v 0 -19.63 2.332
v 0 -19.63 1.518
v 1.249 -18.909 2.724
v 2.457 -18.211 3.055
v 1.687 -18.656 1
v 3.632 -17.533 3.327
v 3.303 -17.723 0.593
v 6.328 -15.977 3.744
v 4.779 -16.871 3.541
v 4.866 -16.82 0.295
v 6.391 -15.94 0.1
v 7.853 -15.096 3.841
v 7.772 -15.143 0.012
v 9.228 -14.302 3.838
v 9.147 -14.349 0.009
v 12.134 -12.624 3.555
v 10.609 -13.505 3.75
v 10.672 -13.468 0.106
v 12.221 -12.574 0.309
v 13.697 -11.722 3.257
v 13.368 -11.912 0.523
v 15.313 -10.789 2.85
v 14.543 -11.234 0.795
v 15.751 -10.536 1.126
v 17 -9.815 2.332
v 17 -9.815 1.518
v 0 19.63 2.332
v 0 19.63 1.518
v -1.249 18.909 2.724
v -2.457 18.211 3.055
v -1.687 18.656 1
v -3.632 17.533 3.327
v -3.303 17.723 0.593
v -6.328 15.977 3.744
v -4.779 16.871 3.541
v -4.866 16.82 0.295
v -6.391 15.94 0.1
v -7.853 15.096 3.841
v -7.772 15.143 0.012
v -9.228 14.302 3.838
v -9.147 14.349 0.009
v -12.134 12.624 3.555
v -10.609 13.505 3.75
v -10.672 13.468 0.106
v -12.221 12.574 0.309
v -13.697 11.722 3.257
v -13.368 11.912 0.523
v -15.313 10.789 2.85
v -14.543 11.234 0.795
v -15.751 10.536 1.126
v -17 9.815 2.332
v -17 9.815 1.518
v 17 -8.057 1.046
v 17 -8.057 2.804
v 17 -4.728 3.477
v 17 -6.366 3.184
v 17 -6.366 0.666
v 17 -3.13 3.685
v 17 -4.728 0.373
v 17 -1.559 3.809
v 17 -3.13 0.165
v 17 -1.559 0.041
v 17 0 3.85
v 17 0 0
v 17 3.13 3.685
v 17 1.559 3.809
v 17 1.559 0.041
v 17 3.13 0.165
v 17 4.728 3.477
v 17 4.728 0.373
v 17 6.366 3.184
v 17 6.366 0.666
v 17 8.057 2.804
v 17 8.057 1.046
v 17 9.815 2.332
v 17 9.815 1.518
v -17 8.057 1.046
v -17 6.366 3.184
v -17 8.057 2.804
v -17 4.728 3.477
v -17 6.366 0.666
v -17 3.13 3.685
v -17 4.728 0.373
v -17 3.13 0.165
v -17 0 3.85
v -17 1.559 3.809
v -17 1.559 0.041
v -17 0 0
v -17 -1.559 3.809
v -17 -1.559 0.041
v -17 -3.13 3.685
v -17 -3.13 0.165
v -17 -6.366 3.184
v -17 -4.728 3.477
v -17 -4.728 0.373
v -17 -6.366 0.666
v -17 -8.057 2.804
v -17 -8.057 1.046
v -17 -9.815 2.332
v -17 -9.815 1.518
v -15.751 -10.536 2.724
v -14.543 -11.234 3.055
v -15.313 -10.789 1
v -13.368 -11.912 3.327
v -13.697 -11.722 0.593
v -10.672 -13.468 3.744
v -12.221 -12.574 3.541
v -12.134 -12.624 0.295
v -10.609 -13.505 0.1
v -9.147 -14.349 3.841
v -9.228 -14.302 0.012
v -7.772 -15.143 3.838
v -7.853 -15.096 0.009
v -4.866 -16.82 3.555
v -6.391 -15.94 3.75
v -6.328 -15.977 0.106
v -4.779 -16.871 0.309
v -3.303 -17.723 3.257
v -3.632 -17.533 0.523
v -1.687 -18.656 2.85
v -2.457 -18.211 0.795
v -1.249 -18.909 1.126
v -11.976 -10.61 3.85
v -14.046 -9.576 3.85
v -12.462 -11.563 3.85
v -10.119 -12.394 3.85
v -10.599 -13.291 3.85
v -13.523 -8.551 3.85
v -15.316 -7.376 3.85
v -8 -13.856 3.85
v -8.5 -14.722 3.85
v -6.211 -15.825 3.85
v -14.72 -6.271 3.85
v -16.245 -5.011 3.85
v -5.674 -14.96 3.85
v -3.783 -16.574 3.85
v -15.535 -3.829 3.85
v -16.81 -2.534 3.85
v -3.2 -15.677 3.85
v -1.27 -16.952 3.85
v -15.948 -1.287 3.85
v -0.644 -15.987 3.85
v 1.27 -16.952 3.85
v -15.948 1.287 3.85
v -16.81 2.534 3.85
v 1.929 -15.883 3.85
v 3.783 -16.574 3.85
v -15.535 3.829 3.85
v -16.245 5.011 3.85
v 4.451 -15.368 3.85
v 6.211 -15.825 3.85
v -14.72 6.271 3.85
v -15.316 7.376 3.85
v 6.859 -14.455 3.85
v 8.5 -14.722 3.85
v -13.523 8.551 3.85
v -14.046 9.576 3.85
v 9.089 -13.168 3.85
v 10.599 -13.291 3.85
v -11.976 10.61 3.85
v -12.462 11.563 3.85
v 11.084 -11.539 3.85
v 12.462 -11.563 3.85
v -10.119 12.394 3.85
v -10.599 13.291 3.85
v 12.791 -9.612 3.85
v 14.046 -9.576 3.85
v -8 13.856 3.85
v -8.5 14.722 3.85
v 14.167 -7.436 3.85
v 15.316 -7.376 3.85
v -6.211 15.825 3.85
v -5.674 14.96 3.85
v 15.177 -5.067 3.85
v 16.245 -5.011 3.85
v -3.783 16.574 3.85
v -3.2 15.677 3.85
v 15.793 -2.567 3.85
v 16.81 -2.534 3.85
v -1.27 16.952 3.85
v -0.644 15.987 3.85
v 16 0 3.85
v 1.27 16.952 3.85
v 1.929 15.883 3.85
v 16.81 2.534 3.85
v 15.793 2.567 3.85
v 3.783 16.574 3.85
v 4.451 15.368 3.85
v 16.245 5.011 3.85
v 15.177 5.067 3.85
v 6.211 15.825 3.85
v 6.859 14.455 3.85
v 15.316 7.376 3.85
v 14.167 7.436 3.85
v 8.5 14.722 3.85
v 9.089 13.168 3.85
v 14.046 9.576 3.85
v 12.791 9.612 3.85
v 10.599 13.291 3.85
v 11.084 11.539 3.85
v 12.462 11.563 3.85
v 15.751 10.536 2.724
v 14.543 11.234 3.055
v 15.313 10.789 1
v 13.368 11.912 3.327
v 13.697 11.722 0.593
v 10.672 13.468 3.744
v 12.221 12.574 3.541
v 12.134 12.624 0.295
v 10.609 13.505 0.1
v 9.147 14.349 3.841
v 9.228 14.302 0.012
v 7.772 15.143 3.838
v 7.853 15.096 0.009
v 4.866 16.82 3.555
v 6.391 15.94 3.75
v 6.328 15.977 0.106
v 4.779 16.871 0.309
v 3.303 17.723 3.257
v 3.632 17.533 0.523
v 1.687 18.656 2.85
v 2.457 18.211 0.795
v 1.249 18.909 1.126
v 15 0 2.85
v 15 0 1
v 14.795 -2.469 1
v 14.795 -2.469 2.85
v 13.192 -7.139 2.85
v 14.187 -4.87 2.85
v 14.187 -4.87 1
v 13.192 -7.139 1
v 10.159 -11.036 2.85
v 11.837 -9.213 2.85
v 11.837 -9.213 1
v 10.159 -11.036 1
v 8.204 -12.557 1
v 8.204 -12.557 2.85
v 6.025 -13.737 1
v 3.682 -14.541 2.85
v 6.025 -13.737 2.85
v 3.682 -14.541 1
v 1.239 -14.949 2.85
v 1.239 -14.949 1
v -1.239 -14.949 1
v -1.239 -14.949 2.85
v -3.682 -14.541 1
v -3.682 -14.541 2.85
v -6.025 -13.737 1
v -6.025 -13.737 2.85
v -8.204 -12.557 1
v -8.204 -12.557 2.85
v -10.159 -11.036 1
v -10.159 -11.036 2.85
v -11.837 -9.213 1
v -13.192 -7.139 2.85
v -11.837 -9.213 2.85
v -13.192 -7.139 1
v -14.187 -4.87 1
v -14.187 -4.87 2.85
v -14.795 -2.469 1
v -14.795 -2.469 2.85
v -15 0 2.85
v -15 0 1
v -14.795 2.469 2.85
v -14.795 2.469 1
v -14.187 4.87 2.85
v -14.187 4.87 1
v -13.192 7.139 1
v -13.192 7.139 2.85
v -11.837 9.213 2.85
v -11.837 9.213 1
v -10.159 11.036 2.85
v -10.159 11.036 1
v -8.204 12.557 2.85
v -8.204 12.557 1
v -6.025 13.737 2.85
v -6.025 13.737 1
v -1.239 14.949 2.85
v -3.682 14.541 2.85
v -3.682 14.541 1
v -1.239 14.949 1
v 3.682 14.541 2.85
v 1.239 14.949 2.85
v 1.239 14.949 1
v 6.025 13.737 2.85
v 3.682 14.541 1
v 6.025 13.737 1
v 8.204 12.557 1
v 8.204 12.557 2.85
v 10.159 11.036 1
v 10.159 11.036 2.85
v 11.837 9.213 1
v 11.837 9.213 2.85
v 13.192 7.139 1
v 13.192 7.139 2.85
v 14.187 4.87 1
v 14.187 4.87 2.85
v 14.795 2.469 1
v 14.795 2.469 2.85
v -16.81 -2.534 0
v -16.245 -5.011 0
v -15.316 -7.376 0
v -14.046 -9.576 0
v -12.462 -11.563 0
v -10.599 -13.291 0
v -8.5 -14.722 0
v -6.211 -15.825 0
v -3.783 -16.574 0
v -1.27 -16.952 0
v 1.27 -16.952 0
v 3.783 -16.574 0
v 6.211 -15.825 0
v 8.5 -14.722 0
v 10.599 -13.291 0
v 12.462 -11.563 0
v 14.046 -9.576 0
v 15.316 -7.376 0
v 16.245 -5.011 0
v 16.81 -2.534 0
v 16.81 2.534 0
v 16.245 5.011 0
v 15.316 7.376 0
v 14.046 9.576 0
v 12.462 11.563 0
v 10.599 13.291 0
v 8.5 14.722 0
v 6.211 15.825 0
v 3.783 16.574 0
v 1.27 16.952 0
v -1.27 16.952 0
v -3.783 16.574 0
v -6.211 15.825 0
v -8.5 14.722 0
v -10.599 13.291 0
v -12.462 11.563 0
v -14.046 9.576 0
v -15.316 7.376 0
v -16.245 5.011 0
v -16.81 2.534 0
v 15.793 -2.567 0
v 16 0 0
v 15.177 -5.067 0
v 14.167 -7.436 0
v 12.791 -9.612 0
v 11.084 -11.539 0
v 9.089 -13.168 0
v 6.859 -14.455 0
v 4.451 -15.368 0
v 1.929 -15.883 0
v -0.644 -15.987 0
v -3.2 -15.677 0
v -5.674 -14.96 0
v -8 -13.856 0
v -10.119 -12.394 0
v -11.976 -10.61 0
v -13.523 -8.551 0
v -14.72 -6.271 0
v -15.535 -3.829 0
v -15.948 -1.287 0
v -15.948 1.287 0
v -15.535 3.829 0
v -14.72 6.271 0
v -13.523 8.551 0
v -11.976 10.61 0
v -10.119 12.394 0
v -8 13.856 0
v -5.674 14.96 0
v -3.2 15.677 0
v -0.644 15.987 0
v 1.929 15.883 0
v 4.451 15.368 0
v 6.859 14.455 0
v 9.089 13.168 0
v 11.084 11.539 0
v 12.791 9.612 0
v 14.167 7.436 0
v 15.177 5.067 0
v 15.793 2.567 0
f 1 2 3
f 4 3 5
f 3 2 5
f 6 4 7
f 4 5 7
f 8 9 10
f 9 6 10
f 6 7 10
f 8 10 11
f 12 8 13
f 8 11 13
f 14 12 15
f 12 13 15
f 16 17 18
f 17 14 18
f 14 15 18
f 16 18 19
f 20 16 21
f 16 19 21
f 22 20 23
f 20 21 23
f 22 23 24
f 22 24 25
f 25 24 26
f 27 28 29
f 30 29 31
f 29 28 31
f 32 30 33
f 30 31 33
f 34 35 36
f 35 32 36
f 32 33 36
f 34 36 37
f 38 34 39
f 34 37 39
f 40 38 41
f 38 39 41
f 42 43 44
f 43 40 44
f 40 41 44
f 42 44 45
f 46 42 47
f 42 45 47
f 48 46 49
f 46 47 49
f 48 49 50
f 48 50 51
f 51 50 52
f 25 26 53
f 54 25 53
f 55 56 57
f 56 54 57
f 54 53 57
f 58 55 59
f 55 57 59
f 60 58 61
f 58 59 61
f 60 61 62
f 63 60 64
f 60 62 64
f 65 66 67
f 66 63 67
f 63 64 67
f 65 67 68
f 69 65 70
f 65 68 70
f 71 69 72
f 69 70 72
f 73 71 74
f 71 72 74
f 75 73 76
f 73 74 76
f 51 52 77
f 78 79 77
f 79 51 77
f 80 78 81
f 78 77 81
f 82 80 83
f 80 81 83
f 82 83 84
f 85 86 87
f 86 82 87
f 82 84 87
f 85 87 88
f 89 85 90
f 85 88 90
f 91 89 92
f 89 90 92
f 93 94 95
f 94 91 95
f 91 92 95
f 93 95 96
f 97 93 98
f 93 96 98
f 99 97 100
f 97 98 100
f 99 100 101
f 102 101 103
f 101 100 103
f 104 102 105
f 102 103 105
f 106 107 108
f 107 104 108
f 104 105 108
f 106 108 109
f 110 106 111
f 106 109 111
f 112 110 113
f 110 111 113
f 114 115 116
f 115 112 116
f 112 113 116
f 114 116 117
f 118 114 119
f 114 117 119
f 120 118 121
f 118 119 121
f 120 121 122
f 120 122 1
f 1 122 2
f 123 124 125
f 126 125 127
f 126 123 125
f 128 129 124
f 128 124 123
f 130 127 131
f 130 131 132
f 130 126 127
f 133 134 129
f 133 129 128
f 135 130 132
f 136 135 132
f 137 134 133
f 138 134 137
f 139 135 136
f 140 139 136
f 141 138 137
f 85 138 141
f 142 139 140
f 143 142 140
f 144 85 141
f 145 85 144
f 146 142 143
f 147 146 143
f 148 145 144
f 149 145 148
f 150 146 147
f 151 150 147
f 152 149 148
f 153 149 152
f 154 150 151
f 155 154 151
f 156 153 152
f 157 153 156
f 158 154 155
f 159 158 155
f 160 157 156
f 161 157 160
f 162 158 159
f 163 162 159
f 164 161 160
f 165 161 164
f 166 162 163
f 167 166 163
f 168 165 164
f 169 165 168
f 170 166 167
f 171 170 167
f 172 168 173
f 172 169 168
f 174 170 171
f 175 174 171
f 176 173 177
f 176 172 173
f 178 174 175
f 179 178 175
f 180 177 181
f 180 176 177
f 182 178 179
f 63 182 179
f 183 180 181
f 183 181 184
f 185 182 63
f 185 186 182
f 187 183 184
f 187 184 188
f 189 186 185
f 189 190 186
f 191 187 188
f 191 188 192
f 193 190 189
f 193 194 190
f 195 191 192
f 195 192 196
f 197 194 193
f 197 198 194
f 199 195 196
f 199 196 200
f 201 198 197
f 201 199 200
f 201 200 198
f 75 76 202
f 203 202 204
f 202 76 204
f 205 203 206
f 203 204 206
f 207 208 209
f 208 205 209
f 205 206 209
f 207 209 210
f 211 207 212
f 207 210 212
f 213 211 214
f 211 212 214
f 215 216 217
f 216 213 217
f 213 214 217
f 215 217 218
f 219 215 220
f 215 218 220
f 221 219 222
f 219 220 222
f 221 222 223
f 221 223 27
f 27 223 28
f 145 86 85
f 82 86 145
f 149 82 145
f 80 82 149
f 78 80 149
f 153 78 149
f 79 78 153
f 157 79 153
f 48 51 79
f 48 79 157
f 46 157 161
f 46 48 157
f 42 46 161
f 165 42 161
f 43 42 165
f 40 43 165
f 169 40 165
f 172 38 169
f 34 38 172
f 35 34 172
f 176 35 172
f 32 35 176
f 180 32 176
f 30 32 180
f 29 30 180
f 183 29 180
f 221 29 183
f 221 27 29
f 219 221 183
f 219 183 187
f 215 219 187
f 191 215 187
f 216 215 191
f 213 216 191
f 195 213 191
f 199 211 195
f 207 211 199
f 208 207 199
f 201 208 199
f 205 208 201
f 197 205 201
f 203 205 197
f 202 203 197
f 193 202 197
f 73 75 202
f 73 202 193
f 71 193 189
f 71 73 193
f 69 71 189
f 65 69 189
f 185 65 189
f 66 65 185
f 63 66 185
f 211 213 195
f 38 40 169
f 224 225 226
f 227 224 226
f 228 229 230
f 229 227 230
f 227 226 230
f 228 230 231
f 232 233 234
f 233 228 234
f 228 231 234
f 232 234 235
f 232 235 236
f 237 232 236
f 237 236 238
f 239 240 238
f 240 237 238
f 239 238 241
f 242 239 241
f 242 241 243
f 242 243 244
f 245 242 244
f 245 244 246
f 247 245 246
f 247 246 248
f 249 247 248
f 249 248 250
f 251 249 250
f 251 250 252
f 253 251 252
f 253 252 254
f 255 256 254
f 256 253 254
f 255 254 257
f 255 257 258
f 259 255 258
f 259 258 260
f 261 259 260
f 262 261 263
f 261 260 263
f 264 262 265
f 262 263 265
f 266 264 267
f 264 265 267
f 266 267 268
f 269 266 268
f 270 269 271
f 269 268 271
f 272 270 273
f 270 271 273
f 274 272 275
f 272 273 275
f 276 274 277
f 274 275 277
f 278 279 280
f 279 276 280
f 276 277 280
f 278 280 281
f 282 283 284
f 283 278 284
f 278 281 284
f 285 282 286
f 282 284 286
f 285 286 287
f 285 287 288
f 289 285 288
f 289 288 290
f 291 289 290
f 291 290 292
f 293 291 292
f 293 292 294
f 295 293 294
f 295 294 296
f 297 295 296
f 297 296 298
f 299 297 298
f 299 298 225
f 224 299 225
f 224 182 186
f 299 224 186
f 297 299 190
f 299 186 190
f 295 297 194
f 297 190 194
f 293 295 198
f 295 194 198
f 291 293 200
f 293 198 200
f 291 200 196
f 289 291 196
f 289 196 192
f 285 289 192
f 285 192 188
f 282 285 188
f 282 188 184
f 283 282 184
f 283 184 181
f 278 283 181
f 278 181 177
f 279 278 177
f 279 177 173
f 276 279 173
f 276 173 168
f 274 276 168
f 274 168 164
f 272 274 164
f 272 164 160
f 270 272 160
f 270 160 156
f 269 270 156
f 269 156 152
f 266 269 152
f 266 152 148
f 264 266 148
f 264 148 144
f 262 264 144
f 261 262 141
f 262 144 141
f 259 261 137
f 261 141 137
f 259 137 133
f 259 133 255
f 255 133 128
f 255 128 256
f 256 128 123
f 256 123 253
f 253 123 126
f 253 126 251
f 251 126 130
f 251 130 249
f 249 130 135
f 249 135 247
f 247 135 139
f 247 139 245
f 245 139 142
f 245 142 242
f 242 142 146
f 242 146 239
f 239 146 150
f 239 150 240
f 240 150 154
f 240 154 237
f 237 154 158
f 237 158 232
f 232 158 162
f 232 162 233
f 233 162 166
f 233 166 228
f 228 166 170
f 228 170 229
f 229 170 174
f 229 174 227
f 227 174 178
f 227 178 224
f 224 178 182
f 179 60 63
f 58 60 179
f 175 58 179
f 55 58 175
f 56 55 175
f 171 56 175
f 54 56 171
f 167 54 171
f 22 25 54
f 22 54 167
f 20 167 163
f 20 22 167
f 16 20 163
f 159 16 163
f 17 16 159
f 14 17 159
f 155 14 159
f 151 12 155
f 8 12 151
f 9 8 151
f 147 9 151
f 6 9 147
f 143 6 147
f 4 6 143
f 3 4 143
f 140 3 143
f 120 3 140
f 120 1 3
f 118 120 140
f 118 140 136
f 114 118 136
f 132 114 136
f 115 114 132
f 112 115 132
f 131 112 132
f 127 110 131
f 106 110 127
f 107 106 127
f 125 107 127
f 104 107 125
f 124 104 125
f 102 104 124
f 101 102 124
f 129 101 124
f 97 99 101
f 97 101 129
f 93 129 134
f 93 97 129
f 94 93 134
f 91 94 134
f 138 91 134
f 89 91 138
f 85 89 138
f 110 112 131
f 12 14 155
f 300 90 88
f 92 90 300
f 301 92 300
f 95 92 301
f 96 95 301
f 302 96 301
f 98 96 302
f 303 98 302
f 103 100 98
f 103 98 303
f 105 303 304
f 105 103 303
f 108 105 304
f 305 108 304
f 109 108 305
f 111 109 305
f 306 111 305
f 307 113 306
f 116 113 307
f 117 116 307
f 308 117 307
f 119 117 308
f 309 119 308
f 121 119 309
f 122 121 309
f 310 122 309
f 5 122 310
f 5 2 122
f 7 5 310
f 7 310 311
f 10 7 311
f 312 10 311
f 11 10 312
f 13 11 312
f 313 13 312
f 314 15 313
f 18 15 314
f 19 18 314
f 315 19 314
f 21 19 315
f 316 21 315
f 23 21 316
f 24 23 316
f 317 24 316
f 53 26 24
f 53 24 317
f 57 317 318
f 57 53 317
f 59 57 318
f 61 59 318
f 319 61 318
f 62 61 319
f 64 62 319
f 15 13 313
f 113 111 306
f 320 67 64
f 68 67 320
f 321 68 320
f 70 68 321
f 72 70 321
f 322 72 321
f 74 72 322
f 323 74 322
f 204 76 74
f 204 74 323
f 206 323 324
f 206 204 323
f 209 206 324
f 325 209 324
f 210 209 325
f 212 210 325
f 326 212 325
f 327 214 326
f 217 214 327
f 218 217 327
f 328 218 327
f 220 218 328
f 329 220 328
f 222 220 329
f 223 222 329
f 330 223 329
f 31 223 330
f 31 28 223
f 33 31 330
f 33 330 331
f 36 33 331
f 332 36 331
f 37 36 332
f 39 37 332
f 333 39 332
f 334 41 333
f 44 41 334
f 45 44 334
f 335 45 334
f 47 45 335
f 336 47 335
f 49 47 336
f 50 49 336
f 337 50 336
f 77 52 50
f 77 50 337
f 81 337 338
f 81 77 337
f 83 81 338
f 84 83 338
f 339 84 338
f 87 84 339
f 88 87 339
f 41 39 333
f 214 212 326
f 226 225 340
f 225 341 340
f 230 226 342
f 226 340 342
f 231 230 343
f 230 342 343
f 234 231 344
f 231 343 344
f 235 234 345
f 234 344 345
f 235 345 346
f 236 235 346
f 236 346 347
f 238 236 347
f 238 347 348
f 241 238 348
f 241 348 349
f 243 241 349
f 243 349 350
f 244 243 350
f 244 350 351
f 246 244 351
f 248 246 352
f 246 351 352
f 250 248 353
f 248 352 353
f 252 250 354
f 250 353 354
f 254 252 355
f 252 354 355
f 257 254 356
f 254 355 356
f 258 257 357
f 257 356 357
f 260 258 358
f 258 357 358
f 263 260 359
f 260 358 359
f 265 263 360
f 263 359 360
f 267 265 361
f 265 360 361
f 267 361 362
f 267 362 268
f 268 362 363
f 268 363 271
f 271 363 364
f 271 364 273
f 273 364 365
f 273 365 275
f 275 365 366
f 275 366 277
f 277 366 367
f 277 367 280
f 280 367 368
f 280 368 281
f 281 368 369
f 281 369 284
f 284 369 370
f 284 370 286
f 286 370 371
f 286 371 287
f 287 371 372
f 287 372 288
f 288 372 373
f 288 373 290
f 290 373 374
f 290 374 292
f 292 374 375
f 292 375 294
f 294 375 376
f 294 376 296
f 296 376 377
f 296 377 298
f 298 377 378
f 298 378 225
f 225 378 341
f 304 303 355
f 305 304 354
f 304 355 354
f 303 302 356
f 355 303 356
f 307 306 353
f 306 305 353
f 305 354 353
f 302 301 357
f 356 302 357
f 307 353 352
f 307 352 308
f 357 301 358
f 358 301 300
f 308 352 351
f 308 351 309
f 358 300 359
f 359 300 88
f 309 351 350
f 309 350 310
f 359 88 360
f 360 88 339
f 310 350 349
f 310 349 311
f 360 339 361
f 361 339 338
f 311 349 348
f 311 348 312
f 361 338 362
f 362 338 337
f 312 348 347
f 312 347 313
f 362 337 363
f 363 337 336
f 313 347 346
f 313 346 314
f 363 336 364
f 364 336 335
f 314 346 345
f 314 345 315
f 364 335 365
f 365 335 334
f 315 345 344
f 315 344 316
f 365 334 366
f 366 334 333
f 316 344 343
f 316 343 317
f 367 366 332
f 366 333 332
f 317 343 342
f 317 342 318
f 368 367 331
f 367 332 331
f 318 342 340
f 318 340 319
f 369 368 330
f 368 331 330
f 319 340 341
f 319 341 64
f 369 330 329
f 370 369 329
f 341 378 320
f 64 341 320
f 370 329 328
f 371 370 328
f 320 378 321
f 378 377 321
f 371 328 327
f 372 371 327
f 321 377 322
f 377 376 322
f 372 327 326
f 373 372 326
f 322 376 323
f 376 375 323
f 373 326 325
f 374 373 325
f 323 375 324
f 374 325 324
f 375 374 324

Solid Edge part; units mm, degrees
sketch "Sketch1" plane through (0, 0, 0) normal (0, 0, 1) x (1, 0, 0)
  line L0 (17, 9.815) -> (0, 19.6299)
  line L1 (0, 19.6299) -> (-17, 9.815)
  line L2 (-17, 9.815) -> (-17, -9.815)
  line L3 (-17, -9.815) -> (0, -19.6299)
  line L4 (0, -19.6299) -> (17, -9.815)
  line L5 (17, -9.815) -> (17, 9.815)
  circle A0 centre (0, 0) radius 15
  dimension "D1" = 34
  dimension "D2" = 30
extrude "Protrusion1" add sketch "Sketch1" along normal blind 3.85
chamfer "Fase_1" distance 1 angle 45 2 edges at (-15, 0, 3.85) (-15, 0, 0)
sketch "Sketch2" plane through (0, 0, 0) normal (0, -1, 0) x (1, 0, 0)
  line L0 (-24.1454, -0.2754) -> (-9.8546, 7.9754)
  line L1 (-9.8546, 7.9754) -> (-24.1454, 7.9754)
  line L2 (-24.1454, 7.9754) -> (-24.1454, -0.2754)
revolve "RevolvedCutout1" cut sketch "Sketch2" angle 360 about axis through (0, 0, 0) along (0, 0, 1)
mirror "Mirror1" about plane through (-17, 9.815, 1.925) normal (0, 0, 1) of "RevolvedCutout1"
